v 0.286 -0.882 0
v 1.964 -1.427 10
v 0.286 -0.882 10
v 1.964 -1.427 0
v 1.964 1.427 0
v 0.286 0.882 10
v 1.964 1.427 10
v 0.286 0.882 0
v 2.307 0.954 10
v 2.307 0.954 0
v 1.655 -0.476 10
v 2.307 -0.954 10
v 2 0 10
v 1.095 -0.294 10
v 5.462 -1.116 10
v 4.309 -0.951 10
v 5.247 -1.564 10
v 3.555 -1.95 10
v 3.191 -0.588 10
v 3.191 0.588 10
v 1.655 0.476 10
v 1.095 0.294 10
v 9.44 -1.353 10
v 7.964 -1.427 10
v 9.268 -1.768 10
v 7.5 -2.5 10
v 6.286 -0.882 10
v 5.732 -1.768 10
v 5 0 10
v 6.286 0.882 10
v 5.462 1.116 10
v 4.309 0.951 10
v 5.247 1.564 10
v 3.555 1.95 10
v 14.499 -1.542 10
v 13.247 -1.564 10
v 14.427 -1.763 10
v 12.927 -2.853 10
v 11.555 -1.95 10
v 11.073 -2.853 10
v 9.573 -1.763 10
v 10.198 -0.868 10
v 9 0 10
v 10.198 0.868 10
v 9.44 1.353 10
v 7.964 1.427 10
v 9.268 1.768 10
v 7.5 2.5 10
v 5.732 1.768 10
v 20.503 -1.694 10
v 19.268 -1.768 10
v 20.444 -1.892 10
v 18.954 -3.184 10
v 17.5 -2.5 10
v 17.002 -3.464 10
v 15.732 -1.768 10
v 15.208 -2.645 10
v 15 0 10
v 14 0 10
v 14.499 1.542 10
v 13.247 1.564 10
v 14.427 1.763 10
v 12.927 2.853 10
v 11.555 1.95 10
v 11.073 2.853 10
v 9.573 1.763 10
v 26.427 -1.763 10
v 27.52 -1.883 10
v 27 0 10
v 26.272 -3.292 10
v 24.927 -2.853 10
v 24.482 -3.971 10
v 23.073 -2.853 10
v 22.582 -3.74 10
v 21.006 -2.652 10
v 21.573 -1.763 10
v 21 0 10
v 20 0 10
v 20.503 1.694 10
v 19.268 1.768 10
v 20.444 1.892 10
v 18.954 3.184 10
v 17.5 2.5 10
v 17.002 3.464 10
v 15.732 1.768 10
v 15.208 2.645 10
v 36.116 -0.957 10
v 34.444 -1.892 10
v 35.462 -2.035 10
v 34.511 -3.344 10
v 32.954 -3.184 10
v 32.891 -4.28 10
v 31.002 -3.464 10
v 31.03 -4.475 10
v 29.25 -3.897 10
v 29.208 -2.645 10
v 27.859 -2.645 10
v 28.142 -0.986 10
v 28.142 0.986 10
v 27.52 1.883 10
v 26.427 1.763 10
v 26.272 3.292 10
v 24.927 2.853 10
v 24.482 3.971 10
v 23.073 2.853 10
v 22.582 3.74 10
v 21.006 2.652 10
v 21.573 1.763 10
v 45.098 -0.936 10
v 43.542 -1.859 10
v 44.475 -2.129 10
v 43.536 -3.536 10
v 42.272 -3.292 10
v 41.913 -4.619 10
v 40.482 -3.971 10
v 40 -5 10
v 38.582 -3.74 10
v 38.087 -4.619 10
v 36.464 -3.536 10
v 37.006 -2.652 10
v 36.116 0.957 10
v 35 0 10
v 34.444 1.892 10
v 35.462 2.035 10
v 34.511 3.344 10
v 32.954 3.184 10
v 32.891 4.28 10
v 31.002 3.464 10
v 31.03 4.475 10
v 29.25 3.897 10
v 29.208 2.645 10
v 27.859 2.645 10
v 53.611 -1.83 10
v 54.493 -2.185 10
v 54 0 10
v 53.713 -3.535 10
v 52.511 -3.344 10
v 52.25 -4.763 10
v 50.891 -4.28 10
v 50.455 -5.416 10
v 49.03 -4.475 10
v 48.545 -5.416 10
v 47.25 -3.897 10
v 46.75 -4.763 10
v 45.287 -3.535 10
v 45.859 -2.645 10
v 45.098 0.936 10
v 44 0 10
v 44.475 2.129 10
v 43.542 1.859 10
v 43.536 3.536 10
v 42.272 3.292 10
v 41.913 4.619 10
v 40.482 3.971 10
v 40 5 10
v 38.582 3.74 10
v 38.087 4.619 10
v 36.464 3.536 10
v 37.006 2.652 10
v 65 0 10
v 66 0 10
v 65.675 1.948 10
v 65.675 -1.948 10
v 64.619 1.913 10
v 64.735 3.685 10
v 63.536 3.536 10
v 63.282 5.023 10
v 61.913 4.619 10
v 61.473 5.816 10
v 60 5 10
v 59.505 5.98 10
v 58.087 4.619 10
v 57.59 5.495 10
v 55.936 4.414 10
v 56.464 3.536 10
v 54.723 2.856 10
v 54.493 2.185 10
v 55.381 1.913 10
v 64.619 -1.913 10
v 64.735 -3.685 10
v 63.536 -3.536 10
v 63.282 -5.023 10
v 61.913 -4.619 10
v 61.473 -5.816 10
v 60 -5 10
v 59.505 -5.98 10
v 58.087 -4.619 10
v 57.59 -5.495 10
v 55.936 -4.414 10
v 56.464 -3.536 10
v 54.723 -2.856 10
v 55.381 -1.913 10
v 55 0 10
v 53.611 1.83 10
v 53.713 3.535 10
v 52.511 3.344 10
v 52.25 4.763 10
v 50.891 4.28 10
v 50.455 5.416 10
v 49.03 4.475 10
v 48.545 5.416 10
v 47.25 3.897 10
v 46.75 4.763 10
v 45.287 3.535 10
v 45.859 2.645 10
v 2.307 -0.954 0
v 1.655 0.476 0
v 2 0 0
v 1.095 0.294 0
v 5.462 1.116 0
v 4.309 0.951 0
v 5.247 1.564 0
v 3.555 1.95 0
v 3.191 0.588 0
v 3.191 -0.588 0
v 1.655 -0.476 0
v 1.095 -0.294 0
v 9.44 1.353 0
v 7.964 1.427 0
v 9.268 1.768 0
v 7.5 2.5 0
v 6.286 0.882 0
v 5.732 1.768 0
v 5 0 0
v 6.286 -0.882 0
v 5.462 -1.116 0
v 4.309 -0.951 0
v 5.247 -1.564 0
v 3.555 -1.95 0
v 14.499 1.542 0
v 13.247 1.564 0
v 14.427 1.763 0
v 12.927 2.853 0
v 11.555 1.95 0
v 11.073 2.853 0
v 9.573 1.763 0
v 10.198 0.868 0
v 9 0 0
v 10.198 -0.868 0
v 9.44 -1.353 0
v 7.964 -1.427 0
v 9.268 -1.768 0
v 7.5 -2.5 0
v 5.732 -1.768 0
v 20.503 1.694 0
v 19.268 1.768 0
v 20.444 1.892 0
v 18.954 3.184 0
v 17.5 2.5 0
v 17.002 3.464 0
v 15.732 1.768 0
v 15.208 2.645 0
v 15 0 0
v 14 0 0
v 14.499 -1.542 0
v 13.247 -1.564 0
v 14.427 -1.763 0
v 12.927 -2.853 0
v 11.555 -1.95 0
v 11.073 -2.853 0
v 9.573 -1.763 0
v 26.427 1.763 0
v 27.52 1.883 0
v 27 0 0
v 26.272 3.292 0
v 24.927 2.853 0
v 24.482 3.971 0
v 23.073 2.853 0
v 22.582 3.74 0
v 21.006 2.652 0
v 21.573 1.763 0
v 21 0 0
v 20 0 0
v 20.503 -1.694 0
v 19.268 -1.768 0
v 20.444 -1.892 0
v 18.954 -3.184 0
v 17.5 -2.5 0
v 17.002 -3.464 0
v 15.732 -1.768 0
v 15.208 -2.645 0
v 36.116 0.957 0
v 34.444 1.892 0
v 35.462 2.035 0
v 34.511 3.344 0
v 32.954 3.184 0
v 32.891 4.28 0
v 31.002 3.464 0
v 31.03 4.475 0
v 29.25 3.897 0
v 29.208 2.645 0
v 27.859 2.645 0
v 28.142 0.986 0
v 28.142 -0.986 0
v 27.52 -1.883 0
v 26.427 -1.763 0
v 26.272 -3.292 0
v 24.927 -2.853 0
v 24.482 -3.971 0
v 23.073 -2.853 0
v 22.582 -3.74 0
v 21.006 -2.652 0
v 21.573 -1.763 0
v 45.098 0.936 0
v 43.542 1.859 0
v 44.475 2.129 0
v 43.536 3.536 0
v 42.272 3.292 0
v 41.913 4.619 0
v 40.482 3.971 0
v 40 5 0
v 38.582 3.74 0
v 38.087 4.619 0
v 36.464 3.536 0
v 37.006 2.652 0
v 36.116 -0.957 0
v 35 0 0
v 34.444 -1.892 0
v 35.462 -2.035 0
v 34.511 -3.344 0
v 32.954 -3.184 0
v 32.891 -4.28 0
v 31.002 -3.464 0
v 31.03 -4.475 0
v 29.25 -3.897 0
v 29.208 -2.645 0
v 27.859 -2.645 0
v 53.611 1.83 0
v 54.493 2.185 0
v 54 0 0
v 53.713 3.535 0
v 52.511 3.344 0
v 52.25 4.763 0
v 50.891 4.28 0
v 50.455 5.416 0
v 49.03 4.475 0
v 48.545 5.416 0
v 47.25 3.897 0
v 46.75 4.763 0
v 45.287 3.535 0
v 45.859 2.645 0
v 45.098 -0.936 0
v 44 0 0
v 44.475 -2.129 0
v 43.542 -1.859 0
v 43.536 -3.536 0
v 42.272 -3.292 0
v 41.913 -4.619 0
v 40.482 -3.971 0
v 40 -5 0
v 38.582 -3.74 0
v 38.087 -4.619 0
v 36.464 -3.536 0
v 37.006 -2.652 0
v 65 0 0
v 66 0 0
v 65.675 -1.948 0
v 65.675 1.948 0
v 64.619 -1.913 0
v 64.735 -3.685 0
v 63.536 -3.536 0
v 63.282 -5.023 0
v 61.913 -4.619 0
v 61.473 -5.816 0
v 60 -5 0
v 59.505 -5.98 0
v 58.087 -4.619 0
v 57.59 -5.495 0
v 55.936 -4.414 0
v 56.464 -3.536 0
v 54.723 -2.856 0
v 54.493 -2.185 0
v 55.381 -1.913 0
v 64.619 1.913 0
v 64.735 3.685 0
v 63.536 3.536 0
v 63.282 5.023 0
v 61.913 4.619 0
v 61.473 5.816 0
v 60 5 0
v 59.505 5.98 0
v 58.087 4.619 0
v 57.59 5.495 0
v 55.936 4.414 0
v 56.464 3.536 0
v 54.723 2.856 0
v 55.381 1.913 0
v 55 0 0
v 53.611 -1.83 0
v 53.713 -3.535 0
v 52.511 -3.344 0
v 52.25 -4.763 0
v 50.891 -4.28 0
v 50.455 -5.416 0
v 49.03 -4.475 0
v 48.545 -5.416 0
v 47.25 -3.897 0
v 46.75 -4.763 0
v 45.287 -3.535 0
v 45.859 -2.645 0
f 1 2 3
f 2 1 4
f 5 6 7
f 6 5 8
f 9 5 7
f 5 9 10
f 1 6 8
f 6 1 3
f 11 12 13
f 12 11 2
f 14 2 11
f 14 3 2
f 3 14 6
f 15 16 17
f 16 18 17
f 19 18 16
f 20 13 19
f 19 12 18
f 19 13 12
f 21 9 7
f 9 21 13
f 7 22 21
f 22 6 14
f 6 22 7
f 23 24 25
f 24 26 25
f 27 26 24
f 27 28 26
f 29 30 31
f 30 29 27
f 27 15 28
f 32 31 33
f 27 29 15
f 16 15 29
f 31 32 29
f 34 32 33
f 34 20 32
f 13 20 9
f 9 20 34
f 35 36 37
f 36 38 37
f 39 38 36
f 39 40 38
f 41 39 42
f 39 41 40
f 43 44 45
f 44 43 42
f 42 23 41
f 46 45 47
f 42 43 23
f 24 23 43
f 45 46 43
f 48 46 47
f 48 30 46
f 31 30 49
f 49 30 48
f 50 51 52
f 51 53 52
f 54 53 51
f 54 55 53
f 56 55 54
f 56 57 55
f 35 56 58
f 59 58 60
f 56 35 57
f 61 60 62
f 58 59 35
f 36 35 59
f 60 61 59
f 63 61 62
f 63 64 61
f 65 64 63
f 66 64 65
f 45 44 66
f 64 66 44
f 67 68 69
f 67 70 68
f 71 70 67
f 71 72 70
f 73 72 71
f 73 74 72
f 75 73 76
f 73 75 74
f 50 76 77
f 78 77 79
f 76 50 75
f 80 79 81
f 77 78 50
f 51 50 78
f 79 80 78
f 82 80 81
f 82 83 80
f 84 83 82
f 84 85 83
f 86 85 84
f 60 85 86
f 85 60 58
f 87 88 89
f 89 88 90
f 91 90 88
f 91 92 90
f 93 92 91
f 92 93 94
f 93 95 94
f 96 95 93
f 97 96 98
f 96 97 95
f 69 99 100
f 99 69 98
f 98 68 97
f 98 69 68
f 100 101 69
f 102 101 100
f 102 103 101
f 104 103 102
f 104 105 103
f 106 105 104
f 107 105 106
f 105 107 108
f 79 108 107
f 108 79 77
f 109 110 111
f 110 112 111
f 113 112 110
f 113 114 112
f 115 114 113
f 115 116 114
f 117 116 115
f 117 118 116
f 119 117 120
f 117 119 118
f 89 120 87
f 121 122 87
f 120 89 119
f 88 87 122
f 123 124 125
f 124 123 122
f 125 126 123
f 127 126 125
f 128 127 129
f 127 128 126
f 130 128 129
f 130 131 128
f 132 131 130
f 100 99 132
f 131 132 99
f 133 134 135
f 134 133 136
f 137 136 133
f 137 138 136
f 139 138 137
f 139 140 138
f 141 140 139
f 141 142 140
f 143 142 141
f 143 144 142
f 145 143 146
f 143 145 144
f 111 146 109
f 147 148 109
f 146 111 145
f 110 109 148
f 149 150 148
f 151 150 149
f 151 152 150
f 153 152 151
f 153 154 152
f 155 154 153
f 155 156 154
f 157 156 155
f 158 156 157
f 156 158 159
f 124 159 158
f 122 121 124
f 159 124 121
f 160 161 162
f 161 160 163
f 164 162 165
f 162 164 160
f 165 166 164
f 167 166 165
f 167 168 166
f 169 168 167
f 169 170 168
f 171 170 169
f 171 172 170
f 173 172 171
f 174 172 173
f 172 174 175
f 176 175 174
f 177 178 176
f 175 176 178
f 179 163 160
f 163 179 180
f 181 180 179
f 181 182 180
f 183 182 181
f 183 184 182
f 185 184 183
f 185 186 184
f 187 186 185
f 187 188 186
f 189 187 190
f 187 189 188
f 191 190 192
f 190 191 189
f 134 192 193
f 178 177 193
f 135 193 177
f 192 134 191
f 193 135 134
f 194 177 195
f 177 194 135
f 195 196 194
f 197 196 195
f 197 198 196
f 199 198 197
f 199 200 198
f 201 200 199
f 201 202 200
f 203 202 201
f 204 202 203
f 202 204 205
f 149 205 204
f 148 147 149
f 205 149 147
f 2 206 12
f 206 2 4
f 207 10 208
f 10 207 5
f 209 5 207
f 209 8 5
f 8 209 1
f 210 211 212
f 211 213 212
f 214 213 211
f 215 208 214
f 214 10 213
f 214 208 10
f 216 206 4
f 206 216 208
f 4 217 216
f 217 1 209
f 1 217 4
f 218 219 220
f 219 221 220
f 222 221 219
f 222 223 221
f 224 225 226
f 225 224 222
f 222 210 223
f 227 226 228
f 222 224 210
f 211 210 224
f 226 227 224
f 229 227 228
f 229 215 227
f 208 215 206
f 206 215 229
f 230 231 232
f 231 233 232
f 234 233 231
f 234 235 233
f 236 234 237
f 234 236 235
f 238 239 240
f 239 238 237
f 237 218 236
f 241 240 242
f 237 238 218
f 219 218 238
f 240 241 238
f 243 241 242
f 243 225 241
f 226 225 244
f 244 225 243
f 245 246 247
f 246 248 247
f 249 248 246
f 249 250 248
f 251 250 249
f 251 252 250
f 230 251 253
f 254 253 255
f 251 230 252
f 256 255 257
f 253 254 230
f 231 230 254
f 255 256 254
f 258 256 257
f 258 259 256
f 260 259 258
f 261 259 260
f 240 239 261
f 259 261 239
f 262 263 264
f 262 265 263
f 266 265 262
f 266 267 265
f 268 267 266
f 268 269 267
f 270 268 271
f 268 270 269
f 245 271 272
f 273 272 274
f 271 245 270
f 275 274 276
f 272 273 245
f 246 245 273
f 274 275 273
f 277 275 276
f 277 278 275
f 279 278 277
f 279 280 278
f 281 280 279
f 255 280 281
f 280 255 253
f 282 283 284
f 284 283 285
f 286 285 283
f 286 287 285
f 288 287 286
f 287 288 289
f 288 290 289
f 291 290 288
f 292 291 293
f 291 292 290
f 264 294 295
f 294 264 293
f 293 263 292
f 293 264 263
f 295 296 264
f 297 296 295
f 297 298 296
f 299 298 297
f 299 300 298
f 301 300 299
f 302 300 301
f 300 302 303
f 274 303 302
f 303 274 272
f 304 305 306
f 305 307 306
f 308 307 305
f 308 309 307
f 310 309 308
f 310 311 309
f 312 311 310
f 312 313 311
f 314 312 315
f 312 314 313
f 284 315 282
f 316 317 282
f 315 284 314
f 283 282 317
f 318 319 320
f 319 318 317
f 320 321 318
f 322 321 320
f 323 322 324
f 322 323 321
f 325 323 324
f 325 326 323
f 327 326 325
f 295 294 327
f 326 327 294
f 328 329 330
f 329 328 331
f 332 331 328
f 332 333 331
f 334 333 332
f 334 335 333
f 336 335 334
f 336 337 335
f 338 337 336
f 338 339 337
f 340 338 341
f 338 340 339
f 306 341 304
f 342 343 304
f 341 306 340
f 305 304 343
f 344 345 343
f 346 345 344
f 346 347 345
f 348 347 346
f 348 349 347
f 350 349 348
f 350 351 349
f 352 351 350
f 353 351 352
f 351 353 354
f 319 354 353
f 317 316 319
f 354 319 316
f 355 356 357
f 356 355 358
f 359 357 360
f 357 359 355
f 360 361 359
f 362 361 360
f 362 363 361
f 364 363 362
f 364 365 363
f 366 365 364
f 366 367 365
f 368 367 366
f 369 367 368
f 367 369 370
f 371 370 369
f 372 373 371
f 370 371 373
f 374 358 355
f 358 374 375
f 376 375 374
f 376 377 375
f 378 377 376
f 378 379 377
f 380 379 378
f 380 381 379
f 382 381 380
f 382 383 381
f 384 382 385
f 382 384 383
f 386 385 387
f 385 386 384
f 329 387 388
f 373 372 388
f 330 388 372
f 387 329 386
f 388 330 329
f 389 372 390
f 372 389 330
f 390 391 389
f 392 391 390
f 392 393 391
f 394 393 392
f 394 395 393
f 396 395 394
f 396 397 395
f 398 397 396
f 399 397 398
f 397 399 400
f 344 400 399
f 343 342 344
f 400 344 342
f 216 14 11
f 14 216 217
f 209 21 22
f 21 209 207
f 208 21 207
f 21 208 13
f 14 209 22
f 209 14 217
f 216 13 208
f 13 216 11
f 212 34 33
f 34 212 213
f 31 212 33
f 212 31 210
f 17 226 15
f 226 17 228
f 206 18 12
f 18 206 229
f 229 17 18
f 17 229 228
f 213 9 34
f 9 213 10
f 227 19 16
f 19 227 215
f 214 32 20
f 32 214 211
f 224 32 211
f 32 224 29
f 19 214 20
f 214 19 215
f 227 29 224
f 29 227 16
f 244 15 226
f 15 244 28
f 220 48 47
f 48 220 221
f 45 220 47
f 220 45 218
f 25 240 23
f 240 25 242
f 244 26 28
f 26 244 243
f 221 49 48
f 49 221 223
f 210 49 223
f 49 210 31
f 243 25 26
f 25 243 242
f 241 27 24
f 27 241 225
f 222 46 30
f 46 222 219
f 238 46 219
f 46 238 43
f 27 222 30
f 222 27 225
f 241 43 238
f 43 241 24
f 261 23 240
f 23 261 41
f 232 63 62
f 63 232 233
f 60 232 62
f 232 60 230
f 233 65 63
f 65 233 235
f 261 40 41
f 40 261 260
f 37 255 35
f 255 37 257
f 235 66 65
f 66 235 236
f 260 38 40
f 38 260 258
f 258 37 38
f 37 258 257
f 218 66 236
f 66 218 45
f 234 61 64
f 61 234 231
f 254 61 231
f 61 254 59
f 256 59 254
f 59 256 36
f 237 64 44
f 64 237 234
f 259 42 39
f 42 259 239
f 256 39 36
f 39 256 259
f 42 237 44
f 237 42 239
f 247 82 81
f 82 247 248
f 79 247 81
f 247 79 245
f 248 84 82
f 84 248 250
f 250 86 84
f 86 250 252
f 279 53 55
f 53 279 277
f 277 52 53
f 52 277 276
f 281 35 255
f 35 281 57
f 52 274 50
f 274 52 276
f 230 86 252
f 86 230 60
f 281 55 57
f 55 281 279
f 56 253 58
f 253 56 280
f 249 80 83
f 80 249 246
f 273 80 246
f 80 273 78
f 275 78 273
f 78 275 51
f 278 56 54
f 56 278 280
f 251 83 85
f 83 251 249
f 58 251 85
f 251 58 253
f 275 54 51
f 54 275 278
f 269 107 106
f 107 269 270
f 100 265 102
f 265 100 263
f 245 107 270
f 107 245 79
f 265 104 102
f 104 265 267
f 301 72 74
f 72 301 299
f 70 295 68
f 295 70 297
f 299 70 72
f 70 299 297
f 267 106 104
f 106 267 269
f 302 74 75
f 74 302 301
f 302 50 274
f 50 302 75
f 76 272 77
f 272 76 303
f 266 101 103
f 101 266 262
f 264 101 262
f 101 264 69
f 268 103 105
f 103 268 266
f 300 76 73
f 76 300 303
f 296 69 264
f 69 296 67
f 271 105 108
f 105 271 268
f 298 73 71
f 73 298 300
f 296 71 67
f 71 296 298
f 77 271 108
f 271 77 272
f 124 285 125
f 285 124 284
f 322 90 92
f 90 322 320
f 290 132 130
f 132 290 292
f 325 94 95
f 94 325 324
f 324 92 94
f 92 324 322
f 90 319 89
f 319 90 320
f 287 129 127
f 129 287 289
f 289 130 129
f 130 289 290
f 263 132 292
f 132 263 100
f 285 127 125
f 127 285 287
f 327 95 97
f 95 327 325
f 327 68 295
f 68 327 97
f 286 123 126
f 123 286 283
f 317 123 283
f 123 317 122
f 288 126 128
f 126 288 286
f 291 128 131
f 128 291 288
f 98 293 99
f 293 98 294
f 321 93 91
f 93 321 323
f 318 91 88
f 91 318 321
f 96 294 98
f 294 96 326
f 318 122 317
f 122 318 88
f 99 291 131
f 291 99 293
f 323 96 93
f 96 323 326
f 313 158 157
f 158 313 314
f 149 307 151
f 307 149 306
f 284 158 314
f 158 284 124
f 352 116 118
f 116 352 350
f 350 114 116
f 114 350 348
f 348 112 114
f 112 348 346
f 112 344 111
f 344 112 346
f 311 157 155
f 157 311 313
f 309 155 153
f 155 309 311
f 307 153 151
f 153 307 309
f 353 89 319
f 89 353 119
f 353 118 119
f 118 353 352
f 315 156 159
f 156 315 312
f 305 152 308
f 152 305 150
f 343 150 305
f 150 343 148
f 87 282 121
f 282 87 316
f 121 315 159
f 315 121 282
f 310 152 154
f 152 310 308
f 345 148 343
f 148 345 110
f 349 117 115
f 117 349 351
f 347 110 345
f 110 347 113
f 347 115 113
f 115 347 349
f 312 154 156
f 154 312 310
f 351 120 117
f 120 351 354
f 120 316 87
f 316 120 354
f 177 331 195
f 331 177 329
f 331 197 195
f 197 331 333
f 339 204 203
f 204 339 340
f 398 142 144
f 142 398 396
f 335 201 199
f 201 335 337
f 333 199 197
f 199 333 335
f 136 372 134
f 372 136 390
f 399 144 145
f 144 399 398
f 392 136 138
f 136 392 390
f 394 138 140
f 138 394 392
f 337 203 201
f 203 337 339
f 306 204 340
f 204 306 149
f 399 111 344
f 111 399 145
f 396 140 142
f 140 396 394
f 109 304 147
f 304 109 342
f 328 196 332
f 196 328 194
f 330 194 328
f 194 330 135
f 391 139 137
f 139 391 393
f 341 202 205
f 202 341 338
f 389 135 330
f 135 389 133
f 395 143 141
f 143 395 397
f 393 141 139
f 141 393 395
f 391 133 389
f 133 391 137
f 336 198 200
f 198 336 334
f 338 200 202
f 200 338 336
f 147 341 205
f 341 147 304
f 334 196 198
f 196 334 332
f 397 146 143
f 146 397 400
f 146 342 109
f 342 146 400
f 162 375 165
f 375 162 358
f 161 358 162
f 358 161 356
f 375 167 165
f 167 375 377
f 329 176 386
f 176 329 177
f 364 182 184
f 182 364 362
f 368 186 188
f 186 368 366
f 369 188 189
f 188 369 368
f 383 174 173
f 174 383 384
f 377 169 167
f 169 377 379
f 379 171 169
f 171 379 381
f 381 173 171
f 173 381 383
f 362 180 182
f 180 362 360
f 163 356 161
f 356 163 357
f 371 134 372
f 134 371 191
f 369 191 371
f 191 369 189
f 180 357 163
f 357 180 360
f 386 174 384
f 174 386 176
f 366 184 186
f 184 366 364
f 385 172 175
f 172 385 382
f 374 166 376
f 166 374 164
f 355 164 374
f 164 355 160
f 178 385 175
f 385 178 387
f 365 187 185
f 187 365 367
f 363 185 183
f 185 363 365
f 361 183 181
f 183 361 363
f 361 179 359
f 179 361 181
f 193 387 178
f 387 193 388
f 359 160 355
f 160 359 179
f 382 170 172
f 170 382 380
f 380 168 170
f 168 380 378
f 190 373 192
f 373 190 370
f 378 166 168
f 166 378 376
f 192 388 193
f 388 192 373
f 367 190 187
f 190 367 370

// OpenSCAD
minimum = 1;        // starting guage in mm diameter
maximum = 10;       // stopping guage in mm diameter   
height = 10;        // height of guage

for(i=[minimum:maximum])
{
    // triangular numbers to line everything up next to each other
    translate([i*(i+2)/2,0,0]) cylm(i,i+2,height);
    
}
   
// create cylinder with i and 2 mm wall
module cylm(id, od, len)
{
    difference() 
    {
        cylinder(len,d = od);
        translate([0,0,-1])cylinder(len+2,d=id);
    }
}
